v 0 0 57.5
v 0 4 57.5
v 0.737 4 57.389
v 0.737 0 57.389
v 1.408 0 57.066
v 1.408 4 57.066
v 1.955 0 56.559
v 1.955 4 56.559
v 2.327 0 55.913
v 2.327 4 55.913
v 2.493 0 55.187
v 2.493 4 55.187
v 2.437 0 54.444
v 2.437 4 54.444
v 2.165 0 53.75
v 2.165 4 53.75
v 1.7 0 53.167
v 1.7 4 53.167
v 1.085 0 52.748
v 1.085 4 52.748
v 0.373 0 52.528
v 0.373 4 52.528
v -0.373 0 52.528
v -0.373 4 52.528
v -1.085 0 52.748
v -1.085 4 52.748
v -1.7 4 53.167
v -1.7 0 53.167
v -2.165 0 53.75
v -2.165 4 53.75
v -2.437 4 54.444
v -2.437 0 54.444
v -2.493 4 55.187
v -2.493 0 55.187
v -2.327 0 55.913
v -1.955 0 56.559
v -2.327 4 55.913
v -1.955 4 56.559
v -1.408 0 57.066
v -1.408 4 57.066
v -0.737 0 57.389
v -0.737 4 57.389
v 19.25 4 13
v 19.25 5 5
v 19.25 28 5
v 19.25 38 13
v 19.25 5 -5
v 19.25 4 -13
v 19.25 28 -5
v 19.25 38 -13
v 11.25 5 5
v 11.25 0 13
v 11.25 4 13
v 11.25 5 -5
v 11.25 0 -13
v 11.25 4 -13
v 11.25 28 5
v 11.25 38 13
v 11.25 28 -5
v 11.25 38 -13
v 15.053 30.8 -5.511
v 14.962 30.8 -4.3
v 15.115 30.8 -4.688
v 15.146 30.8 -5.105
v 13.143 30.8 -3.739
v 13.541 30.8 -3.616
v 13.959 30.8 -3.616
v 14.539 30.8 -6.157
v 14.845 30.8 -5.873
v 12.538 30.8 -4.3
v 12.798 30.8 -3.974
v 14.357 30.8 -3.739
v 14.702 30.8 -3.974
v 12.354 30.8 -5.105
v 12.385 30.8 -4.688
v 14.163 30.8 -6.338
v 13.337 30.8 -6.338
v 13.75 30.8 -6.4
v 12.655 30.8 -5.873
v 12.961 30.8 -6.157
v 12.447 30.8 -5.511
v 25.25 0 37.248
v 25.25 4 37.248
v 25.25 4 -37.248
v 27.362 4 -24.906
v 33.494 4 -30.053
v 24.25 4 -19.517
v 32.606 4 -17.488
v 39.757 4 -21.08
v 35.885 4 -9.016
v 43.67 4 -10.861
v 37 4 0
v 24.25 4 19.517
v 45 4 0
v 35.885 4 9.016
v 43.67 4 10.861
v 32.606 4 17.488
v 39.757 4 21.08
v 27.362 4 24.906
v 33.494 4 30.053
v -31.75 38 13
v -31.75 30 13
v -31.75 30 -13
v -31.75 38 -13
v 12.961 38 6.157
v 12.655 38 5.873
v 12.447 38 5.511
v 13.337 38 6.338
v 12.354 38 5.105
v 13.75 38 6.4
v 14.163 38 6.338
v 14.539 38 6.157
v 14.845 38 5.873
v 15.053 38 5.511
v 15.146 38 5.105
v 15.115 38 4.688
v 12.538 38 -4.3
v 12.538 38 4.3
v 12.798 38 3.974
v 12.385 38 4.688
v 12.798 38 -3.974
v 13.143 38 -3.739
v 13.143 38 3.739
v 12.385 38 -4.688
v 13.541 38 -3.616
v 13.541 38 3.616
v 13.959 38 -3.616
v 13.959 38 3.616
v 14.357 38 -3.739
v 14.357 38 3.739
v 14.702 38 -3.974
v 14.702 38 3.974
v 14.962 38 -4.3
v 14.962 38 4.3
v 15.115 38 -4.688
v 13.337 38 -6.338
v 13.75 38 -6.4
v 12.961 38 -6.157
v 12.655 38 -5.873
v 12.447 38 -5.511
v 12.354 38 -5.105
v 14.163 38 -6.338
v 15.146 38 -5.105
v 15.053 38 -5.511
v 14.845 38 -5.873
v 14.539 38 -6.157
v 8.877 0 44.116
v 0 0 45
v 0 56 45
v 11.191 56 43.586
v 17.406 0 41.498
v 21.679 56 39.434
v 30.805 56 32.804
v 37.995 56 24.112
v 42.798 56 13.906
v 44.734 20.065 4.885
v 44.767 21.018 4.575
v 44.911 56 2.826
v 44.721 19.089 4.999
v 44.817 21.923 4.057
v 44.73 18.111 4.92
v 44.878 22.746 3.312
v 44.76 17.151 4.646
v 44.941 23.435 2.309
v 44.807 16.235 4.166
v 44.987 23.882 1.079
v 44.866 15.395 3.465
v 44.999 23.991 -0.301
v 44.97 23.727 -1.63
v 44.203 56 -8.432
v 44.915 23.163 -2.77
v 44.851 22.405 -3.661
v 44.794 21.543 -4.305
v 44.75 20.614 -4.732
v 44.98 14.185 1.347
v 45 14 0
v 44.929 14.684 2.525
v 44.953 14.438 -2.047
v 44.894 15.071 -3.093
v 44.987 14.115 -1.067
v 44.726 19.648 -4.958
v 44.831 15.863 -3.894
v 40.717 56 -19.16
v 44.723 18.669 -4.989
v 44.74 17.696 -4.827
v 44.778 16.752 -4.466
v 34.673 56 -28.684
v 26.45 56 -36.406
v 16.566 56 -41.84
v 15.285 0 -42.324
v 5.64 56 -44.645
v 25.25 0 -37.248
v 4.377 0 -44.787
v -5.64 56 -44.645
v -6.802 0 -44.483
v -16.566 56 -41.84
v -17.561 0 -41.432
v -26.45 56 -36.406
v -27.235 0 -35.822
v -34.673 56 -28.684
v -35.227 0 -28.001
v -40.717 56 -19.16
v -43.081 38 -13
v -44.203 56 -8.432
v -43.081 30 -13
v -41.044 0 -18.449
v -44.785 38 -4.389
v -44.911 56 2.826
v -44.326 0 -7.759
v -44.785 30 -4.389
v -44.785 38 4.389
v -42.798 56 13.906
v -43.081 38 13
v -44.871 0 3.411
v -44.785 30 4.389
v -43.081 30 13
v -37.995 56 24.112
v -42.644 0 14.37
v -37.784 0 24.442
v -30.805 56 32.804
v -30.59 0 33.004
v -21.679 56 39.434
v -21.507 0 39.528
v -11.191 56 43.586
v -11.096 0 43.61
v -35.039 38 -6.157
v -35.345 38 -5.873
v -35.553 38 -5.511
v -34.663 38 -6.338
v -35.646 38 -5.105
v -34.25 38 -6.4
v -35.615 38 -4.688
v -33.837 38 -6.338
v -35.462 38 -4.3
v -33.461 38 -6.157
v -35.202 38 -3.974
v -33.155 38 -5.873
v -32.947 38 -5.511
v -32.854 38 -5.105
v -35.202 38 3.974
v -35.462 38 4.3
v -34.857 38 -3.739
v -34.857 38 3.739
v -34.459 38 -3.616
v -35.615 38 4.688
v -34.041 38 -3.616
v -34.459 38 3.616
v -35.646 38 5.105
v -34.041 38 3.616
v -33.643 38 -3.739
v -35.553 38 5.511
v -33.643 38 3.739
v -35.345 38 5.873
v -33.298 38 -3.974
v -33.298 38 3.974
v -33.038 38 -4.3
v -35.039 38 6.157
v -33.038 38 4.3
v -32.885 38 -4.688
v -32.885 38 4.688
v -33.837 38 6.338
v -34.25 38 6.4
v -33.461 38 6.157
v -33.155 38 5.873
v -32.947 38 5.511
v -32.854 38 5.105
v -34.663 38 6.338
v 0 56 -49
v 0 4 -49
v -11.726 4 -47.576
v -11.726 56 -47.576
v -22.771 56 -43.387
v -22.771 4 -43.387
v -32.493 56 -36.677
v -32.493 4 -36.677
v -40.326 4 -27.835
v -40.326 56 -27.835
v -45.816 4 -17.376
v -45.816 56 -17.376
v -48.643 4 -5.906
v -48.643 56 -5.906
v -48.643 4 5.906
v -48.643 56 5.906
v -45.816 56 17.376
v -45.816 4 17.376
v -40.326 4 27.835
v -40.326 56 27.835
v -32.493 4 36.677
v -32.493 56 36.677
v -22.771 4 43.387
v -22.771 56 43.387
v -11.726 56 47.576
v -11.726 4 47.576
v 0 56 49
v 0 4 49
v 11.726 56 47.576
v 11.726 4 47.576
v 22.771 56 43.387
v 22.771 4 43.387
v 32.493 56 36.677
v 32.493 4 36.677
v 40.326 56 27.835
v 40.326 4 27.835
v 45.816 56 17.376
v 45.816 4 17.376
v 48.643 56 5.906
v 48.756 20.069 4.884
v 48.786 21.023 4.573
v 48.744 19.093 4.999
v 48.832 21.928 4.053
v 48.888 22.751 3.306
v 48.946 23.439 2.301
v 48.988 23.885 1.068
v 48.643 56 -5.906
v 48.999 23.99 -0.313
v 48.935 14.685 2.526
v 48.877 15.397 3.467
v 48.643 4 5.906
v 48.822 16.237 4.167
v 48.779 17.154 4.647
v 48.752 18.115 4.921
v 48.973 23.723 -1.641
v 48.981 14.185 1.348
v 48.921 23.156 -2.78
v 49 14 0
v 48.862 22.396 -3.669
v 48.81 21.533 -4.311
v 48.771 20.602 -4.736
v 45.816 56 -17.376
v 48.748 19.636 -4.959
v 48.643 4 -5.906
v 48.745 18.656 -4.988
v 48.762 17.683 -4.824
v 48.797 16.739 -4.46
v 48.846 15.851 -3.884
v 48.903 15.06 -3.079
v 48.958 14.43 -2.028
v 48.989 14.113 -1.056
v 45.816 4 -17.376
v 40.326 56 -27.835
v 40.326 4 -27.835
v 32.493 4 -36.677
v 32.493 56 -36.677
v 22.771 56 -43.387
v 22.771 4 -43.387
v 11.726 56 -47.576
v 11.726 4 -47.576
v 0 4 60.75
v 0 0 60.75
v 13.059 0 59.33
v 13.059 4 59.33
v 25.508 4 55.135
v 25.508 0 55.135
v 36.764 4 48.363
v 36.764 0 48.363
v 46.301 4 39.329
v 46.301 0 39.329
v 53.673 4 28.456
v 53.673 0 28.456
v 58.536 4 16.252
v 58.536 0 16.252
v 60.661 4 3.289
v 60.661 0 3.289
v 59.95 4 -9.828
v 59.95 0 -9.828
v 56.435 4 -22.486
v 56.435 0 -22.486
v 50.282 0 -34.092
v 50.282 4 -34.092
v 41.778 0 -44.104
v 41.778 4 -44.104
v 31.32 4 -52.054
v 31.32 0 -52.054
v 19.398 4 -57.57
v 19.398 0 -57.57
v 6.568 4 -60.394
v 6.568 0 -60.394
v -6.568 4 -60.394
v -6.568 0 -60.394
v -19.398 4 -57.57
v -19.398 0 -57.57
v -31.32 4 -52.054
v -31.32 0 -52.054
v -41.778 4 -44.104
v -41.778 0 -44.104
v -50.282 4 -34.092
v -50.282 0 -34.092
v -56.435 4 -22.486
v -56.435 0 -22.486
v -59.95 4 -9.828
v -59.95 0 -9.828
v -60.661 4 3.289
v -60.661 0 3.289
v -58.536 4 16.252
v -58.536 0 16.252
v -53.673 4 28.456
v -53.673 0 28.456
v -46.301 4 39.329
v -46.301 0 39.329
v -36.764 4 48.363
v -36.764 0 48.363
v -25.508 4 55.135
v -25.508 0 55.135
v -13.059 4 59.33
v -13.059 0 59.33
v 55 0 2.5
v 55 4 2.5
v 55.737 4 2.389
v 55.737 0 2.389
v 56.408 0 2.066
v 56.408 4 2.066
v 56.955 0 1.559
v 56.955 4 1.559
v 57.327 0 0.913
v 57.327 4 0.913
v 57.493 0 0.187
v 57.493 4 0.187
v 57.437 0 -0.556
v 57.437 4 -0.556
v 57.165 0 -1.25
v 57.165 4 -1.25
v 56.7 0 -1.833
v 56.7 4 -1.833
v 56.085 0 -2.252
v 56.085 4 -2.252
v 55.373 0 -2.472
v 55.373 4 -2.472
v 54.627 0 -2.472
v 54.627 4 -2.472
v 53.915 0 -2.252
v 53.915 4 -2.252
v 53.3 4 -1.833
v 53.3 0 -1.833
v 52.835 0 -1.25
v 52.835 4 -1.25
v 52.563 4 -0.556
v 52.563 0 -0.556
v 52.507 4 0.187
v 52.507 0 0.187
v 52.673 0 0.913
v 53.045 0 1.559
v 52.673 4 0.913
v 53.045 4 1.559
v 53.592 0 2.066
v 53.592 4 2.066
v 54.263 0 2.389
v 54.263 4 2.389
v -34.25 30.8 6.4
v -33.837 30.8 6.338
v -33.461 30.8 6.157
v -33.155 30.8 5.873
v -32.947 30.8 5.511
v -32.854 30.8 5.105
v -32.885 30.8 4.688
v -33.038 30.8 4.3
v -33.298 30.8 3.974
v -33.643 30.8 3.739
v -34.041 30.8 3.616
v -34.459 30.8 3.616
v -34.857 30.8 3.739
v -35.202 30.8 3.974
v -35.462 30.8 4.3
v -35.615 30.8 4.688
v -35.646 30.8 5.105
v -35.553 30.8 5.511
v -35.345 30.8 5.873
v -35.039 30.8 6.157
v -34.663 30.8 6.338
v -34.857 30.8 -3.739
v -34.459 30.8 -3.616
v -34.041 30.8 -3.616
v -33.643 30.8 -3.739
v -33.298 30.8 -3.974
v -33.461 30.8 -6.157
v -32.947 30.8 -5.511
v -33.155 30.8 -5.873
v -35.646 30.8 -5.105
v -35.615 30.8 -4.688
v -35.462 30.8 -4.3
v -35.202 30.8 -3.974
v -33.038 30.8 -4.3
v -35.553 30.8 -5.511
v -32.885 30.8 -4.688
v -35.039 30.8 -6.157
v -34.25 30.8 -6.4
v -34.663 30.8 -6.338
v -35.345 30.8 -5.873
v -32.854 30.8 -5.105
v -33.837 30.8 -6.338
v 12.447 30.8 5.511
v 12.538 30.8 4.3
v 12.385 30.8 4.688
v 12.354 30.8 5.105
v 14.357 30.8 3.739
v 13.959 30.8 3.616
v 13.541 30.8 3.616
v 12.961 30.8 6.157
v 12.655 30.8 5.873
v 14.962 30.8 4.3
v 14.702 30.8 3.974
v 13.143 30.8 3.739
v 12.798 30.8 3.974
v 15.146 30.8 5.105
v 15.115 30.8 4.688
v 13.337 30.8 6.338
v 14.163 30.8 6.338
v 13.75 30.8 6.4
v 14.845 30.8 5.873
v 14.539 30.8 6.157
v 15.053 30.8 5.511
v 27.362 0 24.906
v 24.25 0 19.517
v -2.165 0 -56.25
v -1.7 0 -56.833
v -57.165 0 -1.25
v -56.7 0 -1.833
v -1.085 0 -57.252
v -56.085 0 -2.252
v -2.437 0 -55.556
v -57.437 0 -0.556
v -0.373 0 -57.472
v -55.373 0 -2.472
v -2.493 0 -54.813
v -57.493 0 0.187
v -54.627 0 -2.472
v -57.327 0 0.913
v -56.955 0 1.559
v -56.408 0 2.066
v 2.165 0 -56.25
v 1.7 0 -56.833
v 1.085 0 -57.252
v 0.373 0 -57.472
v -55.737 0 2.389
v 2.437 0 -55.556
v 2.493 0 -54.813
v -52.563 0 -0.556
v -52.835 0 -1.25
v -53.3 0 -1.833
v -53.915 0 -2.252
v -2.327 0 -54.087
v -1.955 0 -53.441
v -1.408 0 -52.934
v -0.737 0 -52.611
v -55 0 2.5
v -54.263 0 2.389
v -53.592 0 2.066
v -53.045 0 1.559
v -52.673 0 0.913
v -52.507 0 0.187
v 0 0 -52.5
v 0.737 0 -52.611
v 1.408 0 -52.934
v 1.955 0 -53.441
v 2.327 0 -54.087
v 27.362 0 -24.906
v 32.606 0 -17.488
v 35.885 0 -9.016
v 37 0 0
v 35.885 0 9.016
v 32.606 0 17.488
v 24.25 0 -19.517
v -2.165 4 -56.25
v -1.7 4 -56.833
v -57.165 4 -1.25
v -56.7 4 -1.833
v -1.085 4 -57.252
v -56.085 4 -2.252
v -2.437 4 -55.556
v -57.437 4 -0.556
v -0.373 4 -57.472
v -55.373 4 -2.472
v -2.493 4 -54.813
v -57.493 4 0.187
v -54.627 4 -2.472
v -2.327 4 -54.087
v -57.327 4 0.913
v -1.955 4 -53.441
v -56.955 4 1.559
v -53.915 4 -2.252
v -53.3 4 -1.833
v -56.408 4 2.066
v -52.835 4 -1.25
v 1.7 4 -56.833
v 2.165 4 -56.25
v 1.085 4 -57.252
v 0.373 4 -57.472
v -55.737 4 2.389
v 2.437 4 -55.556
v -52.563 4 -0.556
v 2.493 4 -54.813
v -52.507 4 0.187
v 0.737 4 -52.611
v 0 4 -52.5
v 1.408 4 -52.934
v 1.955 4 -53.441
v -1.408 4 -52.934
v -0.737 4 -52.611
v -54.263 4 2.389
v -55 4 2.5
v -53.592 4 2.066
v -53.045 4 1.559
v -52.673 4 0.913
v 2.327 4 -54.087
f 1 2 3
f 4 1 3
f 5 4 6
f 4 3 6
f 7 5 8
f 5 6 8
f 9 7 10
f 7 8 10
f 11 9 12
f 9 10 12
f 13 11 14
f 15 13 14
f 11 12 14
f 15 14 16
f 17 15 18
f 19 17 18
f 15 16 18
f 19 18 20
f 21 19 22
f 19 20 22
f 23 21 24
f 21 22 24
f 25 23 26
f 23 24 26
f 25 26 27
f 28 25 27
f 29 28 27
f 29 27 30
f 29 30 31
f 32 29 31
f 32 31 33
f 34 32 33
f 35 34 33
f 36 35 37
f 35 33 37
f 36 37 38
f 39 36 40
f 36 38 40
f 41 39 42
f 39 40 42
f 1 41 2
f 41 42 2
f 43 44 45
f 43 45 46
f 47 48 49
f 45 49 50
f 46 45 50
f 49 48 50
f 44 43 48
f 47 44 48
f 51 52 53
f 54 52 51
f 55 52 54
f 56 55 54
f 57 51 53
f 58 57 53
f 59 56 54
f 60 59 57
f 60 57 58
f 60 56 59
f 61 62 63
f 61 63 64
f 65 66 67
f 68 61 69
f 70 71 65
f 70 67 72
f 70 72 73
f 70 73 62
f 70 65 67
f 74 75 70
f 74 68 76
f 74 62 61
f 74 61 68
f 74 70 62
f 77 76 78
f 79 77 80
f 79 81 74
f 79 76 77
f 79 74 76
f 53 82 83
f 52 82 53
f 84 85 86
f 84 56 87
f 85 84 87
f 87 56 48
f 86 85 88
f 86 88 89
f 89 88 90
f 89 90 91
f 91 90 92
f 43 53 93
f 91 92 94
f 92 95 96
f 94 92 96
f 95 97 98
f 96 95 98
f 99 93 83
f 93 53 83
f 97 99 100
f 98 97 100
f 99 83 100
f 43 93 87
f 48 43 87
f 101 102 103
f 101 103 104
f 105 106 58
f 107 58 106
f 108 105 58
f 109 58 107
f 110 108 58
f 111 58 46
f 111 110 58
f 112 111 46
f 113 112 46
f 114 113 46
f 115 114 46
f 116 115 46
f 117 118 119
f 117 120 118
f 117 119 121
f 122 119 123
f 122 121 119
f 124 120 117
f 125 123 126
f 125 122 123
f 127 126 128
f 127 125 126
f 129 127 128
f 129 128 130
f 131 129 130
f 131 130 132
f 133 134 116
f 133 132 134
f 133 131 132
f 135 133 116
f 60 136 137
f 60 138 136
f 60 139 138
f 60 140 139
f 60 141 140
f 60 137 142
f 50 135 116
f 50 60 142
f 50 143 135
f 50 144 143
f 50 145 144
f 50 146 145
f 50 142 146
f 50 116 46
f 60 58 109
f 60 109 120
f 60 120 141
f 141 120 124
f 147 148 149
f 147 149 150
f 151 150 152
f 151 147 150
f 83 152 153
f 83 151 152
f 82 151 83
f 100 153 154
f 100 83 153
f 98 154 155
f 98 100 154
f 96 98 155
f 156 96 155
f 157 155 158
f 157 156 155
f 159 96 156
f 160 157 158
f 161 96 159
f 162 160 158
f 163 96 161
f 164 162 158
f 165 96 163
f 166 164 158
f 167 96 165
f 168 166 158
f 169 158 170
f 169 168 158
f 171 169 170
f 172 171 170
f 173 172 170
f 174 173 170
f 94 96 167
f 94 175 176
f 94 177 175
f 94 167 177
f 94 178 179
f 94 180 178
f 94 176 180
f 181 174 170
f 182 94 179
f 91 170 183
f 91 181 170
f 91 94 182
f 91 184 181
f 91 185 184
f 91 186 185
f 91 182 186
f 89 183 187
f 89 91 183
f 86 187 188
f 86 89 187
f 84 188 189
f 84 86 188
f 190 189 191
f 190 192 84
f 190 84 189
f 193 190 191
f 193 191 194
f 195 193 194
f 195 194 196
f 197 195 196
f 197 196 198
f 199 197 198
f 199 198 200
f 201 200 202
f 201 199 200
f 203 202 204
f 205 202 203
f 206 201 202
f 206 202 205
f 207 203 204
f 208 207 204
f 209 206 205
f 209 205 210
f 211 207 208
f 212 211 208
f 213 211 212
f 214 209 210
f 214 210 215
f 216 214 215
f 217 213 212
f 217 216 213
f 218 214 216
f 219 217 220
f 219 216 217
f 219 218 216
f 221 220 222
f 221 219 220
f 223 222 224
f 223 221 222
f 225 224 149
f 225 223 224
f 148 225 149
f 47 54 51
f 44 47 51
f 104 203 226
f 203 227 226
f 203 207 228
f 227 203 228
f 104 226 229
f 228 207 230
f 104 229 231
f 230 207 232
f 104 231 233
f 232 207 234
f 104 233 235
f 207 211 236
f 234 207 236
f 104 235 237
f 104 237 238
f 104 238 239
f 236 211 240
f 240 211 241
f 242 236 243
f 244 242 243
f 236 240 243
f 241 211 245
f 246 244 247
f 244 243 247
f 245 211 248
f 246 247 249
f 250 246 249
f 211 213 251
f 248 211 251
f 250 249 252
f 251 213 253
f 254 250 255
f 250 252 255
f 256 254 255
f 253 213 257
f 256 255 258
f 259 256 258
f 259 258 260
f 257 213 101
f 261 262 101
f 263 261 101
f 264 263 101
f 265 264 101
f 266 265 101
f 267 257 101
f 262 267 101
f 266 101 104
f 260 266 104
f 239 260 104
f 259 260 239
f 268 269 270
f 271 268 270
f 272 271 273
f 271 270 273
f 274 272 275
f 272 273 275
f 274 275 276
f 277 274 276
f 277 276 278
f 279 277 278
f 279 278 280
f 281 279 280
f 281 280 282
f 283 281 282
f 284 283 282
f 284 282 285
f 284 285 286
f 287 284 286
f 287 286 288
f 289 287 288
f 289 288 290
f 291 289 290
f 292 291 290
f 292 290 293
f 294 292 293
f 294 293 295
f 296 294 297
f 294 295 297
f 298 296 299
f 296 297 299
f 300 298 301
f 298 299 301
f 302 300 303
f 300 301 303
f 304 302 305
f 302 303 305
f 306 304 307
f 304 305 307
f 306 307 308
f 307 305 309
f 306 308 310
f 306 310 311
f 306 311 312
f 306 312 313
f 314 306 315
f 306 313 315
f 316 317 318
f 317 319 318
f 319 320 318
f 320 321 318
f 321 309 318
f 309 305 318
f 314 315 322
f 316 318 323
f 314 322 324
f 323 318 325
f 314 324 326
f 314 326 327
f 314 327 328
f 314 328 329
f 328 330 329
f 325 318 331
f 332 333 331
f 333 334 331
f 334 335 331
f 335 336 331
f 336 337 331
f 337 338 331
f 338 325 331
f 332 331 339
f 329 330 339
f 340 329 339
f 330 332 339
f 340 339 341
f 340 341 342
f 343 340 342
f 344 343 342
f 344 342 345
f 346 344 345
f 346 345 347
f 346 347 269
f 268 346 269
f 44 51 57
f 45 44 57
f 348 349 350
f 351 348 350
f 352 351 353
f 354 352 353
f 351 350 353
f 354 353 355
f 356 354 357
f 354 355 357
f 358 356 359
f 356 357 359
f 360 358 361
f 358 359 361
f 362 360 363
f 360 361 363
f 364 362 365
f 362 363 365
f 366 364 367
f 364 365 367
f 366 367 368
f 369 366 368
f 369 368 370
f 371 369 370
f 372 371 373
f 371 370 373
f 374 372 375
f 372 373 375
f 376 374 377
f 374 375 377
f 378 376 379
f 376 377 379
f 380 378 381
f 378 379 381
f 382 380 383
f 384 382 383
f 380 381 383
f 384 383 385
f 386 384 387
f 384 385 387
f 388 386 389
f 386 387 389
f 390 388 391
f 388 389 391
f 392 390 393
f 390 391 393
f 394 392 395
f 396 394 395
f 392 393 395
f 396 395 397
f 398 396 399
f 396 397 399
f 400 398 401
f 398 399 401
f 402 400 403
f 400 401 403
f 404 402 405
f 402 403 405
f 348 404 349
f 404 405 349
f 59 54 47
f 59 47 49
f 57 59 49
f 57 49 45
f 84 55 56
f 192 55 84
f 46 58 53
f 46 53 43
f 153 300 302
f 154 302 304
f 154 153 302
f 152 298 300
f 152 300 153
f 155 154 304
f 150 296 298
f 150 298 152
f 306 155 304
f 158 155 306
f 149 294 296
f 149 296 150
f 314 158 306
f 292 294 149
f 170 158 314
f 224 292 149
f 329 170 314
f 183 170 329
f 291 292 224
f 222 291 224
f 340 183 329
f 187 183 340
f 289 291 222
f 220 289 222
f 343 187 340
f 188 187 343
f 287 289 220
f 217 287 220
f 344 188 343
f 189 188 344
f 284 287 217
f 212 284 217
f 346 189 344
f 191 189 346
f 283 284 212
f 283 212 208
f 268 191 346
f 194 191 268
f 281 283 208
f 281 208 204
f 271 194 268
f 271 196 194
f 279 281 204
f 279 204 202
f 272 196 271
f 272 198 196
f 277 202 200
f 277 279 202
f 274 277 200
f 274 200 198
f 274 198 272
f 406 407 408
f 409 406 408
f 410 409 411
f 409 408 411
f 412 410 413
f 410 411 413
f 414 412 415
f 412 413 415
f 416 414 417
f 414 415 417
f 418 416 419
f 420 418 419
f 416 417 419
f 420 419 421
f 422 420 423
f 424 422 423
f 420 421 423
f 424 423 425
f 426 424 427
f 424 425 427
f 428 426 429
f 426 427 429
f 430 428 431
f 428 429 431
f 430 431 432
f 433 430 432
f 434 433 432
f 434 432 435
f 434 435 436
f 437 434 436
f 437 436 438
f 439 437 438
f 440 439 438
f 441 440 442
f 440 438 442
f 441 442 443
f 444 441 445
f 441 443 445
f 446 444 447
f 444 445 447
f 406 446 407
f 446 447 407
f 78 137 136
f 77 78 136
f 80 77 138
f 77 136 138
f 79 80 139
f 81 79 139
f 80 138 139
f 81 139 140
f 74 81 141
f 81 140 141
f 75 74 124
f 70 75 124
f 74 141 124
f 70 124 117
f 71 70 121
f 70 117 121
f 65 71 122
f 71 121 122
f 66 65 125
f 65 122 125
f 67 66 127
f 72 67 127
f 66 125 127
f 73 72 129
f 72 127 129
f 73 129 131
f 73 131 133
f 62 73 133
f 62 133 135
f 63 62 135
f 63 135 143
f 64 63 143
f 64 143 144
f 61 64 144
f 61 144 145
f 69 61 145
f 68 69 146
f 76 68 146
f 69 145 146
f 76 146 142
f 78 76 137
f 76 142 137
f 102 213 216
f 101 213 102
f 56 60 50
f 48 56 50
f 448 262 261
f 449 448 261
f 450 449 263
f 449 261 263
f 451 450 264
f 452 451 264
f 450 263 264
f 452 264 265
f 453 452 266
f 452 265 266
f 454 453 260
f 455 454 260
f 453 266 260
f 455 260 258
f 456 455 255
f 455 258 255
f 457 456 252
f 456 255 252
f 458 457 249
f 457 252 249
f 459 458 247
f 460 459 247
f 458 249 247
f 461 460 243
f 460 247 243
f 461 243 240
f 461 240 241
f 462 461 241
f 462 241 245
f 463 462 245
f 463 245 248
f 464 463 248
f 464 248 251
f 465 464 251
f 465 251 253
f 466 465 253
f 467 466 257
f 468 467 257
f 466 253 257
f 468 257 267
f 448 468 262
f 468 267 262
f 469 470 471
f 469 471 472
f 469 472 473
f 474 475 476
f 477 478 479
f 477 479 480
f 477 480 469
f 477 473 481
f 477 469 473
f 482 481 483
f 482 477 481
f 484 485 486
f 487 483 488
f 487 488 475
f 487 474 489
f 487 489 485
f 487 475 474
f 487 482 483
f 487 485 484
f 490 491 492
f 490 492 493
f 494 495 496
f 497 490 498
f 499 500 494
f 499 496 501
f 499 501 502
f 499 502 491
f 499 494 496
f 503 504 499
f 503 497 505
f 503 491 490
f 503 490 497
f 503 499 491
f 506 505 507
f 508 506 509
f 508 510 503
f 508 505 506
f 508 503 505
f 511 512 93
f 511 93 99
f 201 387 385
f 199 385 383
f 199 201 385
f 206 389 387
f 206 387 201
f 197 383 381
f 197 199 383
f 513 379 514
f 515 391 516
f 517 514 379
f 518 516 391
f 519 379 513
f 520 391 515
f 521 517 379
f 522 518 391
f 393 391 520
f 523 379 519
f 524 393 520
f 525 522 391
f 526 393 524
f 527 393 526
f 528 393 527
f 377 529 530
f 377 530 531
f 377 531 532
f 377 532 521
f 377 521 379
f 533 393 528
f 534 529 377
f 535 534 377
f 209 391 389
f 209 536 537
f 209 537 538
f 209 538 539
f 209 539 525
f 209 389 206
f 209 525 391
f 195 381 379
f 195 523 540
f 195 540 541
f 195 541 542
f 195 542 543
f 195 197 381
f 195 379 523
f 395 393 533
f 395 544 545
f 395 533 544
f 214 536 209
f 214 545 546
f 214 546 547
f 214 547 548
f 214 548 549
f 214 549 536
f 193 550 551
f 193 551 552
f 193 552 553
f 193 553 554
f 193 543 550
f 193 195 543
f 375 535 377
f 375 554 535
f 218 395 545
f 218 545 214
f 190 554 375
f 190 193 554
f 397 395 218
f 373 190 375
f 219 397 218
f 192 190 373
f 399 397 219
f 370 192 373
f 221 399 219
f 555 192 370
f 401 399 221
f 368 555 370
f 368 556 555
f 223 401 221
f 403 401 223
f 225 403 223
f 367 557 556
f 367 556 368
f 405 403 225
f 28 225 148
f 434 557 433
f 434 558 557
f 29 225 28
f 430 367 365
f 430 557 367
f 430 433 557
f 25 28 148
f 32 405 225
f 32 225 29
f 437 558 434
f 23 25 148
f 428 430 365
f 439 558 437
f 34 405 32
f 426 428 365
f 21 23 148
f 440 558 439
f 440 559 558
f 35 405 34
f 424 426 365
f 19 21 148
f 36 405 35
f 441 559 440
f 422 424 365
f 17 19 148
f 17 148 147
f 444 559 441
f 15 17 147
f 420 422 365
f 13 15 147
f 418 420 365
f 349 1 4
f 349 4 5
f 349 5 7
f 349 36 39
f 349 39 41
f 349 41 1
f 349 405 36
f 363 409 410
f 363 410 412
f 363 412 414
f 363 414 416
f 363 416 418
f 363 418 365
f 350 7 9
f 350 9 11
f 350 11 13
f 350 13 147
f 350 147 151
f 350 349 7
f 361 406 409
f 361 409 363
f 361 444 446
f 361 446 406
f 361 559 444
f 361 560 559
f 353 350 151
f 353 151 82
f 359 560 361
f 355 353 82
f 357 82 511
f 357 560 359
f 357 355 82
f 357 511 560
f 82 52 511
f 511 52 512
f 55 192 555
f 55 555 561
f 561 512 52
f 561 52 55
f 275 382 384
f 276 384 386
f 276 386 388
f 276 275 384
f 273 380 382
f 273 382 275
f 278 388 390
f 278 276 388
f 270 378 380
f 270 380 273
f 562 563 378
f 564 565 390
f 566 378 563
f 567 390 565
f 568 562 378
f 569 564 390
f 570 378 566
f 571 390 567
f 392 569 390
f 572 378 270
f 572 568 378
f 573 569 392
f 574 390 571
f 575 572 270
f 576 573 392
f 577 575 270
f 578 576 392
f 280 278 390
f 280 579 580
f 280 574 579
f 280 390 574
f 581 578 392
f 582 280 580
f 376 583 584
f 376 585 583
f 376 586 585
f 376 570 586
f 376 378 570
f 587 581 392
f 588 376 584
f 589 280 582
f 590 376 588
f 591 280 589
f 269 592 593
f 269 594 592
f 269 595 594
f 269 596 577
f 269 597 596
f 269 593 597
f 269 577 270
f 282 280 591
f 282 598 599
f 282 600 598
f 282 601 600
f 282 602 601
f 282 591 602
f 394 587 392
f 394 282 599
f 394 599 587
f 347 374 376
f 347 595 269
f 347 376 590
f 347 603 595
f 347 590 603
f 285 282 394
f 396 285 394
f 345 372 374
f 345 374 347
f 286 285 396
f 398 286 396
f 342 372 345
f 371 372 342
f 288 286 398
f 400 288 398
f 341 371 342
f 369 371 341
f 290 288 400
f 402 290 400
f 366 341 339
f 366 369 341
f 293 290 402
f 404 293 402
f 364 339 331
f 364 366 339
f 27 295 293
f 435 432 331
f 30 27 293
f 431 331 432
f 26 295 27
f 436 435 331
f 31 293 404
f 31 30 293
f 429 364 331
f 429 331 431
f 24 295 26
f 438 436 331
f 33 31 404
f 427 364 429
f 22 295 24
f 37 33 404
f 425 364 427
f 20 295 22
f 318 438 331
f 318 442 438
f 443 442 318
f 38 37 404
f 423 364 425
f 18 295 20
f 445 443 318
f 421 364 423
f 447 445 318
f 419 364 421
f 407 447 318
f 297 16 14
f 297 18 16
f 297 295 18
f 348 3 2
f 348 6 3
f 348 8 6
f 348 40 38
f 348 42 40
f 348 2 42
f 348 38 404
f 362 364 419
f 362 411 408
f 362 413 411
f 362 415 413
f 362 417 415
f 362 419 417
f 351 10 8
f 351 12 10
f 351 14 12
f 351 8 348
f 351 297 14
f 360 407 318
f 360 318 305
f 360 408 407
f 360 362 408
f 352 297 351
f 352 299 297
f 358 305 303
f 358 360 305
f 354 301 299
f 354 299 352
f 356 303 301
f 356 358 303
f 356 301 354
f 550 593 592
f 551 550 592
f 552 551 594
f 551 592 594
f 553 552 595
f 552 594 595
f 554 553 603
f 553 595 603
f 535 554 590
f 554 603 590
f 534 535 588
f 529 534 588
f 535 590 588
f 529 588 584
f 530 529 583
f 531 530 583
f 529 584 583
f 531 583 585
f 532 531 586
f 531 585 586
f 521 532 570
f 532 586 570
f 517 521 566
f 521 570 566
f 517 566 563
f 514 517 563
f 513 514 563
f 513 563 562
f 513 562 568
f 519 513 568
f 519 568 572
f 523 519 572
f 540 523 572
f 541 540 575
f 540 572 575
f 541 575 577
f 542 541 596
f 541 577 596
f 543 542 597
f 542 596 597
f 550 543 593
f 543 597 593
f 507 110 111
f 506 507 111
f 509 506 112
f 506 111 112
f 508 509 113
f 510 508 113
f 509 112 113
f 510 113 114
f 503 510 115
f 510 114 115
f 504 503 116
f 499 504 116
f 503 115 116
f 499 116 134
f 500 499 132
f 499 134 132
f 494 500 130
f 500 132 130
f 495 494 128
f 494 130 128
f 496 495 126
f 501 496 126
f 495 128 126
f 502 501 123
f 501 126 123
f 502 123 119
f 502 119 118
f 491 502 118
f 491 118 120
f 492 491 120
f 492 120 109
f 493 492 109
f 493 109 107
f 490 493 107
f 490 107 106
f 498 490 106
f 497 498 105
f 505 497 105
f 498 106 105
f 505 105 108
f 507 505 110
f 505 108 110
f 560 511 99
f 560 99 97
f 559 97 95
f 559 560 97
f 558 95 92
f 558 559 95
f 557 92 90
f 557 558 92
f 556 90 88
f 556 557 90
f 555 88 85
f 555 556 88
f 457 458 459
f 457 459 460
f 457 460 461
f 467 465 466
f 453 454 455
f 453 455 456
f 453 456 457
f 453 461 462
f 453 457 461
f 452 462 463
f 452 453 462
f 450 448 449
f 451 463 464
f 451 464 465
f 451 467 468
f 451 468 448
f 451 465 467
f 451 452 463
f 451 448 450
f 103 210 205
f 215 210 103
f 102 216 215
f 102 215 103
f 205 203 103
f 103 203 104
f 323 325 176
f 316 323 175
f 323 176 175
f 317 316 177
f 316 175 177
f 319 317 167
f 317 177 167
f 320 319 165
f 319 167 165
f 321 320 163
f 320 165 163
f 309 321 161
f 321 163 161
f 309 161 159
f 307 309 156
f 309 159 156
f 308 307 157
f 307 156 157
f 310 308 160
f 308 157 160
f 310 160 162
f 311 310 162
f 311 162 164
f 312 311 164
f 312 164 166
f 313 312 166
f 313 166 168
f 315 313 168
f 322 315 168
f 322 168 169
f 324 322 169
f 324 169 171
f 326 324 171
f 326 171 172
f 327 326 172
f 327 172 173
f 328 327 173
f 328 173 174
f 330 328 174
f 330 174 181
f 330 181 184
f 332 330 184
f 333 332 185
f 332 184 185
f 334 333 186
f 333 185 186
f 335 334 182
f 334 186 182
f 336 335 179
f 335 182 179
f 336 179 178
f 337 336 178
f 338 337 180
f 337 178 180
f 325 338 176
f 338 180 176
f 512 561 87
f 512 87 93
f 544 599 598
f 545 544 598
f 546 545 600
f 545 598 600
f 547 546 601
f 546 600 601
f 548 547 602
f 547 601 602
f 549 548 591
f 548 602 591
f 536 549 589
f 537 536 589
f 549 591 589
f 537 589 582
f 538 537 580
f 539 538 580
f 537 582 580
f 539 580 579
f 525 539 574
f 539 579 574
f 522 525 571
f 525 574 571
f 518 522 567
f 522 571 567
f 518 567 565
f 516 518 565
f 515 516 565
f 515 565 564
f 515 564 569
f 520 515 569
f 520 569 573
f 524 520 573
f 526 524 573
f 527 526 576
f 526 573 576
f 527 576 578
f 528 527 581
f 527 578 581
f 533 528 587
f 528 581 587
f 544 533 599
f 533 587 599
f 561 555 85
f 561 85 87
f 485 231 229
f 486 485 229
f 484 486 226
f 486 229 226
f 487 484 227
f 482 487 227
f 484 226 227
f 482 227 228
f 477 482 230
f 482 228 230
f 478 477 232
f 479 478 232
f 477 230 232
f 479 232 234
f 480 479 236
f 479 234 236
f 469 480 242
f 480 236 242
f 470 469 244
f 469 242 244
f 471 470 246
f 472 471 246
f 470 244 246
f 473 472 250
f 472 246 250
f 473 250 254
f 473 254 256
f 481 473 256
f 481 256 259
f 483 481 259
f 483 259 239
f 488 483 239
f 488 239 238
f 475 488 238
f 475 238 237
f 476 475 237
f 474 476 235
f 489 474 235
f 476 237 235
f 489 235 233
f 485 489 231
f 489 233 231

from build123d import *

# Parameters (mm, degrees)
SKETCH1_R               = 60.75
SKETCH1_R_2             = 45
BOSS_EXTRUDE1_DEPTH     = 4
SKETCH2_R               = 49
SKETCH2_R_2             = 45
BOSS_EXTRUDE2_DEPTH     = 52
SKETCH3_W               = 8
SKETCH3_H               = 38
SKETCH3_W_2             = 15
SKETCH3_H_2             = 8
BOSS_EXTRUDE3_DEPTH     = 13
SKETCH4_W               = 10
SKETCH4_H               = 23
CUT_EXTRUDE1_DEPTH      = 8
CUT_EXTRUDE2_REACH      = 111.593
CUT_EXTRUDE2_END_RADIUS = 49
SKETCH5_R               = 5
SKETCH6_R               = 1.4
CUT_EXTRUDE3_DEPTH      = 7.2
BOSS_EXTRUDE4_DEPTH     = 4
SKETCH8_R               = 2.5
CUT_EXTRUDE4_DEPTH      = 4


with BuildPart() as part:
    # Sketch1 → Boss-Extrude1 (new body)
    with BuildSketch(Plane(origin=(0, 0, 0), x_dir=(1, 0, 0), z_dir=(0, 1, 0))):
        with Locations(Location((0, 0, 0), (0, 0, 270))):
            Circle(SKETCH1_R)
        with Locations(Location((0, 0, 0), (0, 0, 270))):
            Circle(SKETCH1_R_2, mode=Mode.SUBTRACT)
    extrude(amount=BOSS_EXTRUDE1_DEPTH)

    # Sketch2 → Boss-Extrude2 (add)
    with BuildSketch(Plane(origin=(0, 4, 0), x_dir=(1, 0, 0), z_dir=(0, 1, 0))):
        with Locations(Location((0, 0, 0), (0, 0, 90))):
            Circle(SKETCH2_R)
        with Locations(Location((0, 0, 0), (0, 0, 270))):
            Circle(SKETCH2_R_2, mode=Mode.SUBTRACT)
    extrude(amount=BOSS_EXTRUDE2_DEPTH)

    # Sketch3 → Boss-Extrude3 (add, symmetric)
    with BuildSketch(Plane.XY):
        with Locations((15.25, 19)):
            Rectangle(SKETCH3_W, SKETCH3_H)
        with Locations((-39.25, 34)):
            Rectangle(SKETCH3_W_2, SKETCH3_H_2)
    extrude(amount=BOSS_EXTRUDE3_DEPTH, both=True)


with BuildPart() as boss_extrude3_piece_1:
    # of the separate pieces the step leaves, piece 1, a body of its own (boss_extrude3_pieces)
    add(part.part.solids().sort_by_distance((0, 0, 60.75))[0])

    # Cut-Extrude2: up to this cylinder (the profile starts inside it)
    cut_extrude2_end = Plane(origin=(0, 19, 0), z_dir=(0, -1, 0)) * Cylinder(CUT_EXTRUDE2_END_RADIUS, 322.186, mode=Mode.PRIVATE)
    # Sketch5 → Cut-Extrude2 (cut, up to the surface)
    with BuildSketch(Plane.ZY.offset(-11.25), mode=Mode.PRIVATE) as cut_extrude2_sk1:
        with Locations(Location((0, 19, 0), (0, 0, 270))):
            Circle(SKETCH5_R)
    cut_extrude2_tool1 = extrude(cut_extrude2_sk1.sketch, amount=-CUT_EXTRUDE2_REACH, mode=Mode.PRIVATE) & cut_extrude2_end
    add(cut_extrude2_tool1.solids().sort_by_distance((11.25, 19, 0))[0], mode=Mode.SUBTRACT)


with BuildPart() as boss_extrude3_piece_2:
    # of the separate pieces the step leaves, piece 2, a body of its own (boss_extrude3_pieces)
    add(part.part.solids().sort_by_distance((11.25, 0, -13))[0])

    # Sketch4 → Cut-Extrude1 (cut)
    with BuildSketch(Plane.ZY.offset(-11.25)):
        with Locations((0, 16.5)):
            Rectangle(SKETCH4_W, SKETCH4_H)
    extrude(amount=-CUT_EXTRUDE1_DEPTH, mode=Mode.SUBTRACT)


with BuildPart() as cut_extrude3_tool:
    # Sketch6 → Cut-Extrude3 (new body)
    with BuildSketch(Plane(origin=(0, 38, 0), x_dir=(1, 0, 0), z_dir=(0, 1, 0))):
        with Locations(Location((-34.25, -5, 0), (0, 0, 270))):
            Circle(SKETCH6_R)
        with Locations(Location((13.75, -5, 0), (0, 0, 270))):
            Circle(SKETCH6_R)
        with Locations(Location((13.75, 5, 0), (0, 0, 90))):
            Circle(SKETCH6_R)
        with Locations(Location((-34.25, 5, 0), (0, 0, 90))):
            Circle(SKETCH6_R)
    extrude(amount=-CUT_EXTRUDE3_DEPTH)


with BuildPart() as boss_extrude3_piece_1_1:
    add(boss_extrude3_piece_1.part)

    # Cut-Extrude3: cut by cut_extrude3_tool
    add(cut_extrude3_tool.part, mode=Mode.SUBTRACT)



with BuildPart() as boss_extrude3_piece_2_1:
    add(boss_extrude3_piece_2.part)

    # Cut-Extrude3: cut by cut_extrude3_tool
    add(cut_extrude3_tool.part, mode=Mode.SUBTRACT)


with BuildPart() as boss_extrude3_piece_1_2:
    add(boss_extrude3_piece_1_1.part)

    add(boss_extrude3_piece_2_1.part)  # Boss-Extrude4 merges Boss-Extrude3 piece 2
    # Sketch7 → Boss-Extrude4 (add)
    with BuildSketch(Plane.XZ):
        with BuildLine():
            Line((11.25, -13), (25.249838503, -37.248431585))
            ThreePointArc((25.249838503, -37.248431585), (45, 0), (25.249838503, 37.248431585))
            Line((25.249838503, 37.248431585), (11.25, 13))
            Line((11.25, 13), (11.25, -13))
        make_face()
        with BuildLine():
            Line((24.25, 19.516660498), (27.361802413, 24.906460381))
            ThreePointArc((27.361802413, 24.906460381), (37, 0), (27.361802413, -24.906460381))
            Line((27.361802413, -24.906460381), (24.25, -19.516660498))
            Line((24.25, -19.516660498), (24.25, 19.516660498))
        make_face(mode=Mode.SUBTRACT)
    extrude(amount=-BOSS_EXTRUDE4_DEPTH)

    # Sketch8 → Cut-Extrude4 (cut)
    with BuildSketch(Plane(origin=(0, 4, 0), x_dir=(1, 0, 0), z_dir=(0, 1, 0))):
        with Locations(Location((-55, 0, 0), (0, 0, 270))):
            Circle(SKETCH8_R)
        with Locations(Location((0, 55, 0), (0, 0, 270))):
            Circle(SKETCH8_R)
        with Locations(Location((55, 0, 0), (0, 0, 270))):
            Circle(SKETCH8_R)
        with Locations(Location((0, -55, 0), (0, 0, 270))):
            Circle(SKETCH8_R)
    extrude(amount=-CUT_EXTRUDE4_DEPTH, mode=Mode.SUBTRACT)


solid = boss_extrude3_piece_1_2.part
